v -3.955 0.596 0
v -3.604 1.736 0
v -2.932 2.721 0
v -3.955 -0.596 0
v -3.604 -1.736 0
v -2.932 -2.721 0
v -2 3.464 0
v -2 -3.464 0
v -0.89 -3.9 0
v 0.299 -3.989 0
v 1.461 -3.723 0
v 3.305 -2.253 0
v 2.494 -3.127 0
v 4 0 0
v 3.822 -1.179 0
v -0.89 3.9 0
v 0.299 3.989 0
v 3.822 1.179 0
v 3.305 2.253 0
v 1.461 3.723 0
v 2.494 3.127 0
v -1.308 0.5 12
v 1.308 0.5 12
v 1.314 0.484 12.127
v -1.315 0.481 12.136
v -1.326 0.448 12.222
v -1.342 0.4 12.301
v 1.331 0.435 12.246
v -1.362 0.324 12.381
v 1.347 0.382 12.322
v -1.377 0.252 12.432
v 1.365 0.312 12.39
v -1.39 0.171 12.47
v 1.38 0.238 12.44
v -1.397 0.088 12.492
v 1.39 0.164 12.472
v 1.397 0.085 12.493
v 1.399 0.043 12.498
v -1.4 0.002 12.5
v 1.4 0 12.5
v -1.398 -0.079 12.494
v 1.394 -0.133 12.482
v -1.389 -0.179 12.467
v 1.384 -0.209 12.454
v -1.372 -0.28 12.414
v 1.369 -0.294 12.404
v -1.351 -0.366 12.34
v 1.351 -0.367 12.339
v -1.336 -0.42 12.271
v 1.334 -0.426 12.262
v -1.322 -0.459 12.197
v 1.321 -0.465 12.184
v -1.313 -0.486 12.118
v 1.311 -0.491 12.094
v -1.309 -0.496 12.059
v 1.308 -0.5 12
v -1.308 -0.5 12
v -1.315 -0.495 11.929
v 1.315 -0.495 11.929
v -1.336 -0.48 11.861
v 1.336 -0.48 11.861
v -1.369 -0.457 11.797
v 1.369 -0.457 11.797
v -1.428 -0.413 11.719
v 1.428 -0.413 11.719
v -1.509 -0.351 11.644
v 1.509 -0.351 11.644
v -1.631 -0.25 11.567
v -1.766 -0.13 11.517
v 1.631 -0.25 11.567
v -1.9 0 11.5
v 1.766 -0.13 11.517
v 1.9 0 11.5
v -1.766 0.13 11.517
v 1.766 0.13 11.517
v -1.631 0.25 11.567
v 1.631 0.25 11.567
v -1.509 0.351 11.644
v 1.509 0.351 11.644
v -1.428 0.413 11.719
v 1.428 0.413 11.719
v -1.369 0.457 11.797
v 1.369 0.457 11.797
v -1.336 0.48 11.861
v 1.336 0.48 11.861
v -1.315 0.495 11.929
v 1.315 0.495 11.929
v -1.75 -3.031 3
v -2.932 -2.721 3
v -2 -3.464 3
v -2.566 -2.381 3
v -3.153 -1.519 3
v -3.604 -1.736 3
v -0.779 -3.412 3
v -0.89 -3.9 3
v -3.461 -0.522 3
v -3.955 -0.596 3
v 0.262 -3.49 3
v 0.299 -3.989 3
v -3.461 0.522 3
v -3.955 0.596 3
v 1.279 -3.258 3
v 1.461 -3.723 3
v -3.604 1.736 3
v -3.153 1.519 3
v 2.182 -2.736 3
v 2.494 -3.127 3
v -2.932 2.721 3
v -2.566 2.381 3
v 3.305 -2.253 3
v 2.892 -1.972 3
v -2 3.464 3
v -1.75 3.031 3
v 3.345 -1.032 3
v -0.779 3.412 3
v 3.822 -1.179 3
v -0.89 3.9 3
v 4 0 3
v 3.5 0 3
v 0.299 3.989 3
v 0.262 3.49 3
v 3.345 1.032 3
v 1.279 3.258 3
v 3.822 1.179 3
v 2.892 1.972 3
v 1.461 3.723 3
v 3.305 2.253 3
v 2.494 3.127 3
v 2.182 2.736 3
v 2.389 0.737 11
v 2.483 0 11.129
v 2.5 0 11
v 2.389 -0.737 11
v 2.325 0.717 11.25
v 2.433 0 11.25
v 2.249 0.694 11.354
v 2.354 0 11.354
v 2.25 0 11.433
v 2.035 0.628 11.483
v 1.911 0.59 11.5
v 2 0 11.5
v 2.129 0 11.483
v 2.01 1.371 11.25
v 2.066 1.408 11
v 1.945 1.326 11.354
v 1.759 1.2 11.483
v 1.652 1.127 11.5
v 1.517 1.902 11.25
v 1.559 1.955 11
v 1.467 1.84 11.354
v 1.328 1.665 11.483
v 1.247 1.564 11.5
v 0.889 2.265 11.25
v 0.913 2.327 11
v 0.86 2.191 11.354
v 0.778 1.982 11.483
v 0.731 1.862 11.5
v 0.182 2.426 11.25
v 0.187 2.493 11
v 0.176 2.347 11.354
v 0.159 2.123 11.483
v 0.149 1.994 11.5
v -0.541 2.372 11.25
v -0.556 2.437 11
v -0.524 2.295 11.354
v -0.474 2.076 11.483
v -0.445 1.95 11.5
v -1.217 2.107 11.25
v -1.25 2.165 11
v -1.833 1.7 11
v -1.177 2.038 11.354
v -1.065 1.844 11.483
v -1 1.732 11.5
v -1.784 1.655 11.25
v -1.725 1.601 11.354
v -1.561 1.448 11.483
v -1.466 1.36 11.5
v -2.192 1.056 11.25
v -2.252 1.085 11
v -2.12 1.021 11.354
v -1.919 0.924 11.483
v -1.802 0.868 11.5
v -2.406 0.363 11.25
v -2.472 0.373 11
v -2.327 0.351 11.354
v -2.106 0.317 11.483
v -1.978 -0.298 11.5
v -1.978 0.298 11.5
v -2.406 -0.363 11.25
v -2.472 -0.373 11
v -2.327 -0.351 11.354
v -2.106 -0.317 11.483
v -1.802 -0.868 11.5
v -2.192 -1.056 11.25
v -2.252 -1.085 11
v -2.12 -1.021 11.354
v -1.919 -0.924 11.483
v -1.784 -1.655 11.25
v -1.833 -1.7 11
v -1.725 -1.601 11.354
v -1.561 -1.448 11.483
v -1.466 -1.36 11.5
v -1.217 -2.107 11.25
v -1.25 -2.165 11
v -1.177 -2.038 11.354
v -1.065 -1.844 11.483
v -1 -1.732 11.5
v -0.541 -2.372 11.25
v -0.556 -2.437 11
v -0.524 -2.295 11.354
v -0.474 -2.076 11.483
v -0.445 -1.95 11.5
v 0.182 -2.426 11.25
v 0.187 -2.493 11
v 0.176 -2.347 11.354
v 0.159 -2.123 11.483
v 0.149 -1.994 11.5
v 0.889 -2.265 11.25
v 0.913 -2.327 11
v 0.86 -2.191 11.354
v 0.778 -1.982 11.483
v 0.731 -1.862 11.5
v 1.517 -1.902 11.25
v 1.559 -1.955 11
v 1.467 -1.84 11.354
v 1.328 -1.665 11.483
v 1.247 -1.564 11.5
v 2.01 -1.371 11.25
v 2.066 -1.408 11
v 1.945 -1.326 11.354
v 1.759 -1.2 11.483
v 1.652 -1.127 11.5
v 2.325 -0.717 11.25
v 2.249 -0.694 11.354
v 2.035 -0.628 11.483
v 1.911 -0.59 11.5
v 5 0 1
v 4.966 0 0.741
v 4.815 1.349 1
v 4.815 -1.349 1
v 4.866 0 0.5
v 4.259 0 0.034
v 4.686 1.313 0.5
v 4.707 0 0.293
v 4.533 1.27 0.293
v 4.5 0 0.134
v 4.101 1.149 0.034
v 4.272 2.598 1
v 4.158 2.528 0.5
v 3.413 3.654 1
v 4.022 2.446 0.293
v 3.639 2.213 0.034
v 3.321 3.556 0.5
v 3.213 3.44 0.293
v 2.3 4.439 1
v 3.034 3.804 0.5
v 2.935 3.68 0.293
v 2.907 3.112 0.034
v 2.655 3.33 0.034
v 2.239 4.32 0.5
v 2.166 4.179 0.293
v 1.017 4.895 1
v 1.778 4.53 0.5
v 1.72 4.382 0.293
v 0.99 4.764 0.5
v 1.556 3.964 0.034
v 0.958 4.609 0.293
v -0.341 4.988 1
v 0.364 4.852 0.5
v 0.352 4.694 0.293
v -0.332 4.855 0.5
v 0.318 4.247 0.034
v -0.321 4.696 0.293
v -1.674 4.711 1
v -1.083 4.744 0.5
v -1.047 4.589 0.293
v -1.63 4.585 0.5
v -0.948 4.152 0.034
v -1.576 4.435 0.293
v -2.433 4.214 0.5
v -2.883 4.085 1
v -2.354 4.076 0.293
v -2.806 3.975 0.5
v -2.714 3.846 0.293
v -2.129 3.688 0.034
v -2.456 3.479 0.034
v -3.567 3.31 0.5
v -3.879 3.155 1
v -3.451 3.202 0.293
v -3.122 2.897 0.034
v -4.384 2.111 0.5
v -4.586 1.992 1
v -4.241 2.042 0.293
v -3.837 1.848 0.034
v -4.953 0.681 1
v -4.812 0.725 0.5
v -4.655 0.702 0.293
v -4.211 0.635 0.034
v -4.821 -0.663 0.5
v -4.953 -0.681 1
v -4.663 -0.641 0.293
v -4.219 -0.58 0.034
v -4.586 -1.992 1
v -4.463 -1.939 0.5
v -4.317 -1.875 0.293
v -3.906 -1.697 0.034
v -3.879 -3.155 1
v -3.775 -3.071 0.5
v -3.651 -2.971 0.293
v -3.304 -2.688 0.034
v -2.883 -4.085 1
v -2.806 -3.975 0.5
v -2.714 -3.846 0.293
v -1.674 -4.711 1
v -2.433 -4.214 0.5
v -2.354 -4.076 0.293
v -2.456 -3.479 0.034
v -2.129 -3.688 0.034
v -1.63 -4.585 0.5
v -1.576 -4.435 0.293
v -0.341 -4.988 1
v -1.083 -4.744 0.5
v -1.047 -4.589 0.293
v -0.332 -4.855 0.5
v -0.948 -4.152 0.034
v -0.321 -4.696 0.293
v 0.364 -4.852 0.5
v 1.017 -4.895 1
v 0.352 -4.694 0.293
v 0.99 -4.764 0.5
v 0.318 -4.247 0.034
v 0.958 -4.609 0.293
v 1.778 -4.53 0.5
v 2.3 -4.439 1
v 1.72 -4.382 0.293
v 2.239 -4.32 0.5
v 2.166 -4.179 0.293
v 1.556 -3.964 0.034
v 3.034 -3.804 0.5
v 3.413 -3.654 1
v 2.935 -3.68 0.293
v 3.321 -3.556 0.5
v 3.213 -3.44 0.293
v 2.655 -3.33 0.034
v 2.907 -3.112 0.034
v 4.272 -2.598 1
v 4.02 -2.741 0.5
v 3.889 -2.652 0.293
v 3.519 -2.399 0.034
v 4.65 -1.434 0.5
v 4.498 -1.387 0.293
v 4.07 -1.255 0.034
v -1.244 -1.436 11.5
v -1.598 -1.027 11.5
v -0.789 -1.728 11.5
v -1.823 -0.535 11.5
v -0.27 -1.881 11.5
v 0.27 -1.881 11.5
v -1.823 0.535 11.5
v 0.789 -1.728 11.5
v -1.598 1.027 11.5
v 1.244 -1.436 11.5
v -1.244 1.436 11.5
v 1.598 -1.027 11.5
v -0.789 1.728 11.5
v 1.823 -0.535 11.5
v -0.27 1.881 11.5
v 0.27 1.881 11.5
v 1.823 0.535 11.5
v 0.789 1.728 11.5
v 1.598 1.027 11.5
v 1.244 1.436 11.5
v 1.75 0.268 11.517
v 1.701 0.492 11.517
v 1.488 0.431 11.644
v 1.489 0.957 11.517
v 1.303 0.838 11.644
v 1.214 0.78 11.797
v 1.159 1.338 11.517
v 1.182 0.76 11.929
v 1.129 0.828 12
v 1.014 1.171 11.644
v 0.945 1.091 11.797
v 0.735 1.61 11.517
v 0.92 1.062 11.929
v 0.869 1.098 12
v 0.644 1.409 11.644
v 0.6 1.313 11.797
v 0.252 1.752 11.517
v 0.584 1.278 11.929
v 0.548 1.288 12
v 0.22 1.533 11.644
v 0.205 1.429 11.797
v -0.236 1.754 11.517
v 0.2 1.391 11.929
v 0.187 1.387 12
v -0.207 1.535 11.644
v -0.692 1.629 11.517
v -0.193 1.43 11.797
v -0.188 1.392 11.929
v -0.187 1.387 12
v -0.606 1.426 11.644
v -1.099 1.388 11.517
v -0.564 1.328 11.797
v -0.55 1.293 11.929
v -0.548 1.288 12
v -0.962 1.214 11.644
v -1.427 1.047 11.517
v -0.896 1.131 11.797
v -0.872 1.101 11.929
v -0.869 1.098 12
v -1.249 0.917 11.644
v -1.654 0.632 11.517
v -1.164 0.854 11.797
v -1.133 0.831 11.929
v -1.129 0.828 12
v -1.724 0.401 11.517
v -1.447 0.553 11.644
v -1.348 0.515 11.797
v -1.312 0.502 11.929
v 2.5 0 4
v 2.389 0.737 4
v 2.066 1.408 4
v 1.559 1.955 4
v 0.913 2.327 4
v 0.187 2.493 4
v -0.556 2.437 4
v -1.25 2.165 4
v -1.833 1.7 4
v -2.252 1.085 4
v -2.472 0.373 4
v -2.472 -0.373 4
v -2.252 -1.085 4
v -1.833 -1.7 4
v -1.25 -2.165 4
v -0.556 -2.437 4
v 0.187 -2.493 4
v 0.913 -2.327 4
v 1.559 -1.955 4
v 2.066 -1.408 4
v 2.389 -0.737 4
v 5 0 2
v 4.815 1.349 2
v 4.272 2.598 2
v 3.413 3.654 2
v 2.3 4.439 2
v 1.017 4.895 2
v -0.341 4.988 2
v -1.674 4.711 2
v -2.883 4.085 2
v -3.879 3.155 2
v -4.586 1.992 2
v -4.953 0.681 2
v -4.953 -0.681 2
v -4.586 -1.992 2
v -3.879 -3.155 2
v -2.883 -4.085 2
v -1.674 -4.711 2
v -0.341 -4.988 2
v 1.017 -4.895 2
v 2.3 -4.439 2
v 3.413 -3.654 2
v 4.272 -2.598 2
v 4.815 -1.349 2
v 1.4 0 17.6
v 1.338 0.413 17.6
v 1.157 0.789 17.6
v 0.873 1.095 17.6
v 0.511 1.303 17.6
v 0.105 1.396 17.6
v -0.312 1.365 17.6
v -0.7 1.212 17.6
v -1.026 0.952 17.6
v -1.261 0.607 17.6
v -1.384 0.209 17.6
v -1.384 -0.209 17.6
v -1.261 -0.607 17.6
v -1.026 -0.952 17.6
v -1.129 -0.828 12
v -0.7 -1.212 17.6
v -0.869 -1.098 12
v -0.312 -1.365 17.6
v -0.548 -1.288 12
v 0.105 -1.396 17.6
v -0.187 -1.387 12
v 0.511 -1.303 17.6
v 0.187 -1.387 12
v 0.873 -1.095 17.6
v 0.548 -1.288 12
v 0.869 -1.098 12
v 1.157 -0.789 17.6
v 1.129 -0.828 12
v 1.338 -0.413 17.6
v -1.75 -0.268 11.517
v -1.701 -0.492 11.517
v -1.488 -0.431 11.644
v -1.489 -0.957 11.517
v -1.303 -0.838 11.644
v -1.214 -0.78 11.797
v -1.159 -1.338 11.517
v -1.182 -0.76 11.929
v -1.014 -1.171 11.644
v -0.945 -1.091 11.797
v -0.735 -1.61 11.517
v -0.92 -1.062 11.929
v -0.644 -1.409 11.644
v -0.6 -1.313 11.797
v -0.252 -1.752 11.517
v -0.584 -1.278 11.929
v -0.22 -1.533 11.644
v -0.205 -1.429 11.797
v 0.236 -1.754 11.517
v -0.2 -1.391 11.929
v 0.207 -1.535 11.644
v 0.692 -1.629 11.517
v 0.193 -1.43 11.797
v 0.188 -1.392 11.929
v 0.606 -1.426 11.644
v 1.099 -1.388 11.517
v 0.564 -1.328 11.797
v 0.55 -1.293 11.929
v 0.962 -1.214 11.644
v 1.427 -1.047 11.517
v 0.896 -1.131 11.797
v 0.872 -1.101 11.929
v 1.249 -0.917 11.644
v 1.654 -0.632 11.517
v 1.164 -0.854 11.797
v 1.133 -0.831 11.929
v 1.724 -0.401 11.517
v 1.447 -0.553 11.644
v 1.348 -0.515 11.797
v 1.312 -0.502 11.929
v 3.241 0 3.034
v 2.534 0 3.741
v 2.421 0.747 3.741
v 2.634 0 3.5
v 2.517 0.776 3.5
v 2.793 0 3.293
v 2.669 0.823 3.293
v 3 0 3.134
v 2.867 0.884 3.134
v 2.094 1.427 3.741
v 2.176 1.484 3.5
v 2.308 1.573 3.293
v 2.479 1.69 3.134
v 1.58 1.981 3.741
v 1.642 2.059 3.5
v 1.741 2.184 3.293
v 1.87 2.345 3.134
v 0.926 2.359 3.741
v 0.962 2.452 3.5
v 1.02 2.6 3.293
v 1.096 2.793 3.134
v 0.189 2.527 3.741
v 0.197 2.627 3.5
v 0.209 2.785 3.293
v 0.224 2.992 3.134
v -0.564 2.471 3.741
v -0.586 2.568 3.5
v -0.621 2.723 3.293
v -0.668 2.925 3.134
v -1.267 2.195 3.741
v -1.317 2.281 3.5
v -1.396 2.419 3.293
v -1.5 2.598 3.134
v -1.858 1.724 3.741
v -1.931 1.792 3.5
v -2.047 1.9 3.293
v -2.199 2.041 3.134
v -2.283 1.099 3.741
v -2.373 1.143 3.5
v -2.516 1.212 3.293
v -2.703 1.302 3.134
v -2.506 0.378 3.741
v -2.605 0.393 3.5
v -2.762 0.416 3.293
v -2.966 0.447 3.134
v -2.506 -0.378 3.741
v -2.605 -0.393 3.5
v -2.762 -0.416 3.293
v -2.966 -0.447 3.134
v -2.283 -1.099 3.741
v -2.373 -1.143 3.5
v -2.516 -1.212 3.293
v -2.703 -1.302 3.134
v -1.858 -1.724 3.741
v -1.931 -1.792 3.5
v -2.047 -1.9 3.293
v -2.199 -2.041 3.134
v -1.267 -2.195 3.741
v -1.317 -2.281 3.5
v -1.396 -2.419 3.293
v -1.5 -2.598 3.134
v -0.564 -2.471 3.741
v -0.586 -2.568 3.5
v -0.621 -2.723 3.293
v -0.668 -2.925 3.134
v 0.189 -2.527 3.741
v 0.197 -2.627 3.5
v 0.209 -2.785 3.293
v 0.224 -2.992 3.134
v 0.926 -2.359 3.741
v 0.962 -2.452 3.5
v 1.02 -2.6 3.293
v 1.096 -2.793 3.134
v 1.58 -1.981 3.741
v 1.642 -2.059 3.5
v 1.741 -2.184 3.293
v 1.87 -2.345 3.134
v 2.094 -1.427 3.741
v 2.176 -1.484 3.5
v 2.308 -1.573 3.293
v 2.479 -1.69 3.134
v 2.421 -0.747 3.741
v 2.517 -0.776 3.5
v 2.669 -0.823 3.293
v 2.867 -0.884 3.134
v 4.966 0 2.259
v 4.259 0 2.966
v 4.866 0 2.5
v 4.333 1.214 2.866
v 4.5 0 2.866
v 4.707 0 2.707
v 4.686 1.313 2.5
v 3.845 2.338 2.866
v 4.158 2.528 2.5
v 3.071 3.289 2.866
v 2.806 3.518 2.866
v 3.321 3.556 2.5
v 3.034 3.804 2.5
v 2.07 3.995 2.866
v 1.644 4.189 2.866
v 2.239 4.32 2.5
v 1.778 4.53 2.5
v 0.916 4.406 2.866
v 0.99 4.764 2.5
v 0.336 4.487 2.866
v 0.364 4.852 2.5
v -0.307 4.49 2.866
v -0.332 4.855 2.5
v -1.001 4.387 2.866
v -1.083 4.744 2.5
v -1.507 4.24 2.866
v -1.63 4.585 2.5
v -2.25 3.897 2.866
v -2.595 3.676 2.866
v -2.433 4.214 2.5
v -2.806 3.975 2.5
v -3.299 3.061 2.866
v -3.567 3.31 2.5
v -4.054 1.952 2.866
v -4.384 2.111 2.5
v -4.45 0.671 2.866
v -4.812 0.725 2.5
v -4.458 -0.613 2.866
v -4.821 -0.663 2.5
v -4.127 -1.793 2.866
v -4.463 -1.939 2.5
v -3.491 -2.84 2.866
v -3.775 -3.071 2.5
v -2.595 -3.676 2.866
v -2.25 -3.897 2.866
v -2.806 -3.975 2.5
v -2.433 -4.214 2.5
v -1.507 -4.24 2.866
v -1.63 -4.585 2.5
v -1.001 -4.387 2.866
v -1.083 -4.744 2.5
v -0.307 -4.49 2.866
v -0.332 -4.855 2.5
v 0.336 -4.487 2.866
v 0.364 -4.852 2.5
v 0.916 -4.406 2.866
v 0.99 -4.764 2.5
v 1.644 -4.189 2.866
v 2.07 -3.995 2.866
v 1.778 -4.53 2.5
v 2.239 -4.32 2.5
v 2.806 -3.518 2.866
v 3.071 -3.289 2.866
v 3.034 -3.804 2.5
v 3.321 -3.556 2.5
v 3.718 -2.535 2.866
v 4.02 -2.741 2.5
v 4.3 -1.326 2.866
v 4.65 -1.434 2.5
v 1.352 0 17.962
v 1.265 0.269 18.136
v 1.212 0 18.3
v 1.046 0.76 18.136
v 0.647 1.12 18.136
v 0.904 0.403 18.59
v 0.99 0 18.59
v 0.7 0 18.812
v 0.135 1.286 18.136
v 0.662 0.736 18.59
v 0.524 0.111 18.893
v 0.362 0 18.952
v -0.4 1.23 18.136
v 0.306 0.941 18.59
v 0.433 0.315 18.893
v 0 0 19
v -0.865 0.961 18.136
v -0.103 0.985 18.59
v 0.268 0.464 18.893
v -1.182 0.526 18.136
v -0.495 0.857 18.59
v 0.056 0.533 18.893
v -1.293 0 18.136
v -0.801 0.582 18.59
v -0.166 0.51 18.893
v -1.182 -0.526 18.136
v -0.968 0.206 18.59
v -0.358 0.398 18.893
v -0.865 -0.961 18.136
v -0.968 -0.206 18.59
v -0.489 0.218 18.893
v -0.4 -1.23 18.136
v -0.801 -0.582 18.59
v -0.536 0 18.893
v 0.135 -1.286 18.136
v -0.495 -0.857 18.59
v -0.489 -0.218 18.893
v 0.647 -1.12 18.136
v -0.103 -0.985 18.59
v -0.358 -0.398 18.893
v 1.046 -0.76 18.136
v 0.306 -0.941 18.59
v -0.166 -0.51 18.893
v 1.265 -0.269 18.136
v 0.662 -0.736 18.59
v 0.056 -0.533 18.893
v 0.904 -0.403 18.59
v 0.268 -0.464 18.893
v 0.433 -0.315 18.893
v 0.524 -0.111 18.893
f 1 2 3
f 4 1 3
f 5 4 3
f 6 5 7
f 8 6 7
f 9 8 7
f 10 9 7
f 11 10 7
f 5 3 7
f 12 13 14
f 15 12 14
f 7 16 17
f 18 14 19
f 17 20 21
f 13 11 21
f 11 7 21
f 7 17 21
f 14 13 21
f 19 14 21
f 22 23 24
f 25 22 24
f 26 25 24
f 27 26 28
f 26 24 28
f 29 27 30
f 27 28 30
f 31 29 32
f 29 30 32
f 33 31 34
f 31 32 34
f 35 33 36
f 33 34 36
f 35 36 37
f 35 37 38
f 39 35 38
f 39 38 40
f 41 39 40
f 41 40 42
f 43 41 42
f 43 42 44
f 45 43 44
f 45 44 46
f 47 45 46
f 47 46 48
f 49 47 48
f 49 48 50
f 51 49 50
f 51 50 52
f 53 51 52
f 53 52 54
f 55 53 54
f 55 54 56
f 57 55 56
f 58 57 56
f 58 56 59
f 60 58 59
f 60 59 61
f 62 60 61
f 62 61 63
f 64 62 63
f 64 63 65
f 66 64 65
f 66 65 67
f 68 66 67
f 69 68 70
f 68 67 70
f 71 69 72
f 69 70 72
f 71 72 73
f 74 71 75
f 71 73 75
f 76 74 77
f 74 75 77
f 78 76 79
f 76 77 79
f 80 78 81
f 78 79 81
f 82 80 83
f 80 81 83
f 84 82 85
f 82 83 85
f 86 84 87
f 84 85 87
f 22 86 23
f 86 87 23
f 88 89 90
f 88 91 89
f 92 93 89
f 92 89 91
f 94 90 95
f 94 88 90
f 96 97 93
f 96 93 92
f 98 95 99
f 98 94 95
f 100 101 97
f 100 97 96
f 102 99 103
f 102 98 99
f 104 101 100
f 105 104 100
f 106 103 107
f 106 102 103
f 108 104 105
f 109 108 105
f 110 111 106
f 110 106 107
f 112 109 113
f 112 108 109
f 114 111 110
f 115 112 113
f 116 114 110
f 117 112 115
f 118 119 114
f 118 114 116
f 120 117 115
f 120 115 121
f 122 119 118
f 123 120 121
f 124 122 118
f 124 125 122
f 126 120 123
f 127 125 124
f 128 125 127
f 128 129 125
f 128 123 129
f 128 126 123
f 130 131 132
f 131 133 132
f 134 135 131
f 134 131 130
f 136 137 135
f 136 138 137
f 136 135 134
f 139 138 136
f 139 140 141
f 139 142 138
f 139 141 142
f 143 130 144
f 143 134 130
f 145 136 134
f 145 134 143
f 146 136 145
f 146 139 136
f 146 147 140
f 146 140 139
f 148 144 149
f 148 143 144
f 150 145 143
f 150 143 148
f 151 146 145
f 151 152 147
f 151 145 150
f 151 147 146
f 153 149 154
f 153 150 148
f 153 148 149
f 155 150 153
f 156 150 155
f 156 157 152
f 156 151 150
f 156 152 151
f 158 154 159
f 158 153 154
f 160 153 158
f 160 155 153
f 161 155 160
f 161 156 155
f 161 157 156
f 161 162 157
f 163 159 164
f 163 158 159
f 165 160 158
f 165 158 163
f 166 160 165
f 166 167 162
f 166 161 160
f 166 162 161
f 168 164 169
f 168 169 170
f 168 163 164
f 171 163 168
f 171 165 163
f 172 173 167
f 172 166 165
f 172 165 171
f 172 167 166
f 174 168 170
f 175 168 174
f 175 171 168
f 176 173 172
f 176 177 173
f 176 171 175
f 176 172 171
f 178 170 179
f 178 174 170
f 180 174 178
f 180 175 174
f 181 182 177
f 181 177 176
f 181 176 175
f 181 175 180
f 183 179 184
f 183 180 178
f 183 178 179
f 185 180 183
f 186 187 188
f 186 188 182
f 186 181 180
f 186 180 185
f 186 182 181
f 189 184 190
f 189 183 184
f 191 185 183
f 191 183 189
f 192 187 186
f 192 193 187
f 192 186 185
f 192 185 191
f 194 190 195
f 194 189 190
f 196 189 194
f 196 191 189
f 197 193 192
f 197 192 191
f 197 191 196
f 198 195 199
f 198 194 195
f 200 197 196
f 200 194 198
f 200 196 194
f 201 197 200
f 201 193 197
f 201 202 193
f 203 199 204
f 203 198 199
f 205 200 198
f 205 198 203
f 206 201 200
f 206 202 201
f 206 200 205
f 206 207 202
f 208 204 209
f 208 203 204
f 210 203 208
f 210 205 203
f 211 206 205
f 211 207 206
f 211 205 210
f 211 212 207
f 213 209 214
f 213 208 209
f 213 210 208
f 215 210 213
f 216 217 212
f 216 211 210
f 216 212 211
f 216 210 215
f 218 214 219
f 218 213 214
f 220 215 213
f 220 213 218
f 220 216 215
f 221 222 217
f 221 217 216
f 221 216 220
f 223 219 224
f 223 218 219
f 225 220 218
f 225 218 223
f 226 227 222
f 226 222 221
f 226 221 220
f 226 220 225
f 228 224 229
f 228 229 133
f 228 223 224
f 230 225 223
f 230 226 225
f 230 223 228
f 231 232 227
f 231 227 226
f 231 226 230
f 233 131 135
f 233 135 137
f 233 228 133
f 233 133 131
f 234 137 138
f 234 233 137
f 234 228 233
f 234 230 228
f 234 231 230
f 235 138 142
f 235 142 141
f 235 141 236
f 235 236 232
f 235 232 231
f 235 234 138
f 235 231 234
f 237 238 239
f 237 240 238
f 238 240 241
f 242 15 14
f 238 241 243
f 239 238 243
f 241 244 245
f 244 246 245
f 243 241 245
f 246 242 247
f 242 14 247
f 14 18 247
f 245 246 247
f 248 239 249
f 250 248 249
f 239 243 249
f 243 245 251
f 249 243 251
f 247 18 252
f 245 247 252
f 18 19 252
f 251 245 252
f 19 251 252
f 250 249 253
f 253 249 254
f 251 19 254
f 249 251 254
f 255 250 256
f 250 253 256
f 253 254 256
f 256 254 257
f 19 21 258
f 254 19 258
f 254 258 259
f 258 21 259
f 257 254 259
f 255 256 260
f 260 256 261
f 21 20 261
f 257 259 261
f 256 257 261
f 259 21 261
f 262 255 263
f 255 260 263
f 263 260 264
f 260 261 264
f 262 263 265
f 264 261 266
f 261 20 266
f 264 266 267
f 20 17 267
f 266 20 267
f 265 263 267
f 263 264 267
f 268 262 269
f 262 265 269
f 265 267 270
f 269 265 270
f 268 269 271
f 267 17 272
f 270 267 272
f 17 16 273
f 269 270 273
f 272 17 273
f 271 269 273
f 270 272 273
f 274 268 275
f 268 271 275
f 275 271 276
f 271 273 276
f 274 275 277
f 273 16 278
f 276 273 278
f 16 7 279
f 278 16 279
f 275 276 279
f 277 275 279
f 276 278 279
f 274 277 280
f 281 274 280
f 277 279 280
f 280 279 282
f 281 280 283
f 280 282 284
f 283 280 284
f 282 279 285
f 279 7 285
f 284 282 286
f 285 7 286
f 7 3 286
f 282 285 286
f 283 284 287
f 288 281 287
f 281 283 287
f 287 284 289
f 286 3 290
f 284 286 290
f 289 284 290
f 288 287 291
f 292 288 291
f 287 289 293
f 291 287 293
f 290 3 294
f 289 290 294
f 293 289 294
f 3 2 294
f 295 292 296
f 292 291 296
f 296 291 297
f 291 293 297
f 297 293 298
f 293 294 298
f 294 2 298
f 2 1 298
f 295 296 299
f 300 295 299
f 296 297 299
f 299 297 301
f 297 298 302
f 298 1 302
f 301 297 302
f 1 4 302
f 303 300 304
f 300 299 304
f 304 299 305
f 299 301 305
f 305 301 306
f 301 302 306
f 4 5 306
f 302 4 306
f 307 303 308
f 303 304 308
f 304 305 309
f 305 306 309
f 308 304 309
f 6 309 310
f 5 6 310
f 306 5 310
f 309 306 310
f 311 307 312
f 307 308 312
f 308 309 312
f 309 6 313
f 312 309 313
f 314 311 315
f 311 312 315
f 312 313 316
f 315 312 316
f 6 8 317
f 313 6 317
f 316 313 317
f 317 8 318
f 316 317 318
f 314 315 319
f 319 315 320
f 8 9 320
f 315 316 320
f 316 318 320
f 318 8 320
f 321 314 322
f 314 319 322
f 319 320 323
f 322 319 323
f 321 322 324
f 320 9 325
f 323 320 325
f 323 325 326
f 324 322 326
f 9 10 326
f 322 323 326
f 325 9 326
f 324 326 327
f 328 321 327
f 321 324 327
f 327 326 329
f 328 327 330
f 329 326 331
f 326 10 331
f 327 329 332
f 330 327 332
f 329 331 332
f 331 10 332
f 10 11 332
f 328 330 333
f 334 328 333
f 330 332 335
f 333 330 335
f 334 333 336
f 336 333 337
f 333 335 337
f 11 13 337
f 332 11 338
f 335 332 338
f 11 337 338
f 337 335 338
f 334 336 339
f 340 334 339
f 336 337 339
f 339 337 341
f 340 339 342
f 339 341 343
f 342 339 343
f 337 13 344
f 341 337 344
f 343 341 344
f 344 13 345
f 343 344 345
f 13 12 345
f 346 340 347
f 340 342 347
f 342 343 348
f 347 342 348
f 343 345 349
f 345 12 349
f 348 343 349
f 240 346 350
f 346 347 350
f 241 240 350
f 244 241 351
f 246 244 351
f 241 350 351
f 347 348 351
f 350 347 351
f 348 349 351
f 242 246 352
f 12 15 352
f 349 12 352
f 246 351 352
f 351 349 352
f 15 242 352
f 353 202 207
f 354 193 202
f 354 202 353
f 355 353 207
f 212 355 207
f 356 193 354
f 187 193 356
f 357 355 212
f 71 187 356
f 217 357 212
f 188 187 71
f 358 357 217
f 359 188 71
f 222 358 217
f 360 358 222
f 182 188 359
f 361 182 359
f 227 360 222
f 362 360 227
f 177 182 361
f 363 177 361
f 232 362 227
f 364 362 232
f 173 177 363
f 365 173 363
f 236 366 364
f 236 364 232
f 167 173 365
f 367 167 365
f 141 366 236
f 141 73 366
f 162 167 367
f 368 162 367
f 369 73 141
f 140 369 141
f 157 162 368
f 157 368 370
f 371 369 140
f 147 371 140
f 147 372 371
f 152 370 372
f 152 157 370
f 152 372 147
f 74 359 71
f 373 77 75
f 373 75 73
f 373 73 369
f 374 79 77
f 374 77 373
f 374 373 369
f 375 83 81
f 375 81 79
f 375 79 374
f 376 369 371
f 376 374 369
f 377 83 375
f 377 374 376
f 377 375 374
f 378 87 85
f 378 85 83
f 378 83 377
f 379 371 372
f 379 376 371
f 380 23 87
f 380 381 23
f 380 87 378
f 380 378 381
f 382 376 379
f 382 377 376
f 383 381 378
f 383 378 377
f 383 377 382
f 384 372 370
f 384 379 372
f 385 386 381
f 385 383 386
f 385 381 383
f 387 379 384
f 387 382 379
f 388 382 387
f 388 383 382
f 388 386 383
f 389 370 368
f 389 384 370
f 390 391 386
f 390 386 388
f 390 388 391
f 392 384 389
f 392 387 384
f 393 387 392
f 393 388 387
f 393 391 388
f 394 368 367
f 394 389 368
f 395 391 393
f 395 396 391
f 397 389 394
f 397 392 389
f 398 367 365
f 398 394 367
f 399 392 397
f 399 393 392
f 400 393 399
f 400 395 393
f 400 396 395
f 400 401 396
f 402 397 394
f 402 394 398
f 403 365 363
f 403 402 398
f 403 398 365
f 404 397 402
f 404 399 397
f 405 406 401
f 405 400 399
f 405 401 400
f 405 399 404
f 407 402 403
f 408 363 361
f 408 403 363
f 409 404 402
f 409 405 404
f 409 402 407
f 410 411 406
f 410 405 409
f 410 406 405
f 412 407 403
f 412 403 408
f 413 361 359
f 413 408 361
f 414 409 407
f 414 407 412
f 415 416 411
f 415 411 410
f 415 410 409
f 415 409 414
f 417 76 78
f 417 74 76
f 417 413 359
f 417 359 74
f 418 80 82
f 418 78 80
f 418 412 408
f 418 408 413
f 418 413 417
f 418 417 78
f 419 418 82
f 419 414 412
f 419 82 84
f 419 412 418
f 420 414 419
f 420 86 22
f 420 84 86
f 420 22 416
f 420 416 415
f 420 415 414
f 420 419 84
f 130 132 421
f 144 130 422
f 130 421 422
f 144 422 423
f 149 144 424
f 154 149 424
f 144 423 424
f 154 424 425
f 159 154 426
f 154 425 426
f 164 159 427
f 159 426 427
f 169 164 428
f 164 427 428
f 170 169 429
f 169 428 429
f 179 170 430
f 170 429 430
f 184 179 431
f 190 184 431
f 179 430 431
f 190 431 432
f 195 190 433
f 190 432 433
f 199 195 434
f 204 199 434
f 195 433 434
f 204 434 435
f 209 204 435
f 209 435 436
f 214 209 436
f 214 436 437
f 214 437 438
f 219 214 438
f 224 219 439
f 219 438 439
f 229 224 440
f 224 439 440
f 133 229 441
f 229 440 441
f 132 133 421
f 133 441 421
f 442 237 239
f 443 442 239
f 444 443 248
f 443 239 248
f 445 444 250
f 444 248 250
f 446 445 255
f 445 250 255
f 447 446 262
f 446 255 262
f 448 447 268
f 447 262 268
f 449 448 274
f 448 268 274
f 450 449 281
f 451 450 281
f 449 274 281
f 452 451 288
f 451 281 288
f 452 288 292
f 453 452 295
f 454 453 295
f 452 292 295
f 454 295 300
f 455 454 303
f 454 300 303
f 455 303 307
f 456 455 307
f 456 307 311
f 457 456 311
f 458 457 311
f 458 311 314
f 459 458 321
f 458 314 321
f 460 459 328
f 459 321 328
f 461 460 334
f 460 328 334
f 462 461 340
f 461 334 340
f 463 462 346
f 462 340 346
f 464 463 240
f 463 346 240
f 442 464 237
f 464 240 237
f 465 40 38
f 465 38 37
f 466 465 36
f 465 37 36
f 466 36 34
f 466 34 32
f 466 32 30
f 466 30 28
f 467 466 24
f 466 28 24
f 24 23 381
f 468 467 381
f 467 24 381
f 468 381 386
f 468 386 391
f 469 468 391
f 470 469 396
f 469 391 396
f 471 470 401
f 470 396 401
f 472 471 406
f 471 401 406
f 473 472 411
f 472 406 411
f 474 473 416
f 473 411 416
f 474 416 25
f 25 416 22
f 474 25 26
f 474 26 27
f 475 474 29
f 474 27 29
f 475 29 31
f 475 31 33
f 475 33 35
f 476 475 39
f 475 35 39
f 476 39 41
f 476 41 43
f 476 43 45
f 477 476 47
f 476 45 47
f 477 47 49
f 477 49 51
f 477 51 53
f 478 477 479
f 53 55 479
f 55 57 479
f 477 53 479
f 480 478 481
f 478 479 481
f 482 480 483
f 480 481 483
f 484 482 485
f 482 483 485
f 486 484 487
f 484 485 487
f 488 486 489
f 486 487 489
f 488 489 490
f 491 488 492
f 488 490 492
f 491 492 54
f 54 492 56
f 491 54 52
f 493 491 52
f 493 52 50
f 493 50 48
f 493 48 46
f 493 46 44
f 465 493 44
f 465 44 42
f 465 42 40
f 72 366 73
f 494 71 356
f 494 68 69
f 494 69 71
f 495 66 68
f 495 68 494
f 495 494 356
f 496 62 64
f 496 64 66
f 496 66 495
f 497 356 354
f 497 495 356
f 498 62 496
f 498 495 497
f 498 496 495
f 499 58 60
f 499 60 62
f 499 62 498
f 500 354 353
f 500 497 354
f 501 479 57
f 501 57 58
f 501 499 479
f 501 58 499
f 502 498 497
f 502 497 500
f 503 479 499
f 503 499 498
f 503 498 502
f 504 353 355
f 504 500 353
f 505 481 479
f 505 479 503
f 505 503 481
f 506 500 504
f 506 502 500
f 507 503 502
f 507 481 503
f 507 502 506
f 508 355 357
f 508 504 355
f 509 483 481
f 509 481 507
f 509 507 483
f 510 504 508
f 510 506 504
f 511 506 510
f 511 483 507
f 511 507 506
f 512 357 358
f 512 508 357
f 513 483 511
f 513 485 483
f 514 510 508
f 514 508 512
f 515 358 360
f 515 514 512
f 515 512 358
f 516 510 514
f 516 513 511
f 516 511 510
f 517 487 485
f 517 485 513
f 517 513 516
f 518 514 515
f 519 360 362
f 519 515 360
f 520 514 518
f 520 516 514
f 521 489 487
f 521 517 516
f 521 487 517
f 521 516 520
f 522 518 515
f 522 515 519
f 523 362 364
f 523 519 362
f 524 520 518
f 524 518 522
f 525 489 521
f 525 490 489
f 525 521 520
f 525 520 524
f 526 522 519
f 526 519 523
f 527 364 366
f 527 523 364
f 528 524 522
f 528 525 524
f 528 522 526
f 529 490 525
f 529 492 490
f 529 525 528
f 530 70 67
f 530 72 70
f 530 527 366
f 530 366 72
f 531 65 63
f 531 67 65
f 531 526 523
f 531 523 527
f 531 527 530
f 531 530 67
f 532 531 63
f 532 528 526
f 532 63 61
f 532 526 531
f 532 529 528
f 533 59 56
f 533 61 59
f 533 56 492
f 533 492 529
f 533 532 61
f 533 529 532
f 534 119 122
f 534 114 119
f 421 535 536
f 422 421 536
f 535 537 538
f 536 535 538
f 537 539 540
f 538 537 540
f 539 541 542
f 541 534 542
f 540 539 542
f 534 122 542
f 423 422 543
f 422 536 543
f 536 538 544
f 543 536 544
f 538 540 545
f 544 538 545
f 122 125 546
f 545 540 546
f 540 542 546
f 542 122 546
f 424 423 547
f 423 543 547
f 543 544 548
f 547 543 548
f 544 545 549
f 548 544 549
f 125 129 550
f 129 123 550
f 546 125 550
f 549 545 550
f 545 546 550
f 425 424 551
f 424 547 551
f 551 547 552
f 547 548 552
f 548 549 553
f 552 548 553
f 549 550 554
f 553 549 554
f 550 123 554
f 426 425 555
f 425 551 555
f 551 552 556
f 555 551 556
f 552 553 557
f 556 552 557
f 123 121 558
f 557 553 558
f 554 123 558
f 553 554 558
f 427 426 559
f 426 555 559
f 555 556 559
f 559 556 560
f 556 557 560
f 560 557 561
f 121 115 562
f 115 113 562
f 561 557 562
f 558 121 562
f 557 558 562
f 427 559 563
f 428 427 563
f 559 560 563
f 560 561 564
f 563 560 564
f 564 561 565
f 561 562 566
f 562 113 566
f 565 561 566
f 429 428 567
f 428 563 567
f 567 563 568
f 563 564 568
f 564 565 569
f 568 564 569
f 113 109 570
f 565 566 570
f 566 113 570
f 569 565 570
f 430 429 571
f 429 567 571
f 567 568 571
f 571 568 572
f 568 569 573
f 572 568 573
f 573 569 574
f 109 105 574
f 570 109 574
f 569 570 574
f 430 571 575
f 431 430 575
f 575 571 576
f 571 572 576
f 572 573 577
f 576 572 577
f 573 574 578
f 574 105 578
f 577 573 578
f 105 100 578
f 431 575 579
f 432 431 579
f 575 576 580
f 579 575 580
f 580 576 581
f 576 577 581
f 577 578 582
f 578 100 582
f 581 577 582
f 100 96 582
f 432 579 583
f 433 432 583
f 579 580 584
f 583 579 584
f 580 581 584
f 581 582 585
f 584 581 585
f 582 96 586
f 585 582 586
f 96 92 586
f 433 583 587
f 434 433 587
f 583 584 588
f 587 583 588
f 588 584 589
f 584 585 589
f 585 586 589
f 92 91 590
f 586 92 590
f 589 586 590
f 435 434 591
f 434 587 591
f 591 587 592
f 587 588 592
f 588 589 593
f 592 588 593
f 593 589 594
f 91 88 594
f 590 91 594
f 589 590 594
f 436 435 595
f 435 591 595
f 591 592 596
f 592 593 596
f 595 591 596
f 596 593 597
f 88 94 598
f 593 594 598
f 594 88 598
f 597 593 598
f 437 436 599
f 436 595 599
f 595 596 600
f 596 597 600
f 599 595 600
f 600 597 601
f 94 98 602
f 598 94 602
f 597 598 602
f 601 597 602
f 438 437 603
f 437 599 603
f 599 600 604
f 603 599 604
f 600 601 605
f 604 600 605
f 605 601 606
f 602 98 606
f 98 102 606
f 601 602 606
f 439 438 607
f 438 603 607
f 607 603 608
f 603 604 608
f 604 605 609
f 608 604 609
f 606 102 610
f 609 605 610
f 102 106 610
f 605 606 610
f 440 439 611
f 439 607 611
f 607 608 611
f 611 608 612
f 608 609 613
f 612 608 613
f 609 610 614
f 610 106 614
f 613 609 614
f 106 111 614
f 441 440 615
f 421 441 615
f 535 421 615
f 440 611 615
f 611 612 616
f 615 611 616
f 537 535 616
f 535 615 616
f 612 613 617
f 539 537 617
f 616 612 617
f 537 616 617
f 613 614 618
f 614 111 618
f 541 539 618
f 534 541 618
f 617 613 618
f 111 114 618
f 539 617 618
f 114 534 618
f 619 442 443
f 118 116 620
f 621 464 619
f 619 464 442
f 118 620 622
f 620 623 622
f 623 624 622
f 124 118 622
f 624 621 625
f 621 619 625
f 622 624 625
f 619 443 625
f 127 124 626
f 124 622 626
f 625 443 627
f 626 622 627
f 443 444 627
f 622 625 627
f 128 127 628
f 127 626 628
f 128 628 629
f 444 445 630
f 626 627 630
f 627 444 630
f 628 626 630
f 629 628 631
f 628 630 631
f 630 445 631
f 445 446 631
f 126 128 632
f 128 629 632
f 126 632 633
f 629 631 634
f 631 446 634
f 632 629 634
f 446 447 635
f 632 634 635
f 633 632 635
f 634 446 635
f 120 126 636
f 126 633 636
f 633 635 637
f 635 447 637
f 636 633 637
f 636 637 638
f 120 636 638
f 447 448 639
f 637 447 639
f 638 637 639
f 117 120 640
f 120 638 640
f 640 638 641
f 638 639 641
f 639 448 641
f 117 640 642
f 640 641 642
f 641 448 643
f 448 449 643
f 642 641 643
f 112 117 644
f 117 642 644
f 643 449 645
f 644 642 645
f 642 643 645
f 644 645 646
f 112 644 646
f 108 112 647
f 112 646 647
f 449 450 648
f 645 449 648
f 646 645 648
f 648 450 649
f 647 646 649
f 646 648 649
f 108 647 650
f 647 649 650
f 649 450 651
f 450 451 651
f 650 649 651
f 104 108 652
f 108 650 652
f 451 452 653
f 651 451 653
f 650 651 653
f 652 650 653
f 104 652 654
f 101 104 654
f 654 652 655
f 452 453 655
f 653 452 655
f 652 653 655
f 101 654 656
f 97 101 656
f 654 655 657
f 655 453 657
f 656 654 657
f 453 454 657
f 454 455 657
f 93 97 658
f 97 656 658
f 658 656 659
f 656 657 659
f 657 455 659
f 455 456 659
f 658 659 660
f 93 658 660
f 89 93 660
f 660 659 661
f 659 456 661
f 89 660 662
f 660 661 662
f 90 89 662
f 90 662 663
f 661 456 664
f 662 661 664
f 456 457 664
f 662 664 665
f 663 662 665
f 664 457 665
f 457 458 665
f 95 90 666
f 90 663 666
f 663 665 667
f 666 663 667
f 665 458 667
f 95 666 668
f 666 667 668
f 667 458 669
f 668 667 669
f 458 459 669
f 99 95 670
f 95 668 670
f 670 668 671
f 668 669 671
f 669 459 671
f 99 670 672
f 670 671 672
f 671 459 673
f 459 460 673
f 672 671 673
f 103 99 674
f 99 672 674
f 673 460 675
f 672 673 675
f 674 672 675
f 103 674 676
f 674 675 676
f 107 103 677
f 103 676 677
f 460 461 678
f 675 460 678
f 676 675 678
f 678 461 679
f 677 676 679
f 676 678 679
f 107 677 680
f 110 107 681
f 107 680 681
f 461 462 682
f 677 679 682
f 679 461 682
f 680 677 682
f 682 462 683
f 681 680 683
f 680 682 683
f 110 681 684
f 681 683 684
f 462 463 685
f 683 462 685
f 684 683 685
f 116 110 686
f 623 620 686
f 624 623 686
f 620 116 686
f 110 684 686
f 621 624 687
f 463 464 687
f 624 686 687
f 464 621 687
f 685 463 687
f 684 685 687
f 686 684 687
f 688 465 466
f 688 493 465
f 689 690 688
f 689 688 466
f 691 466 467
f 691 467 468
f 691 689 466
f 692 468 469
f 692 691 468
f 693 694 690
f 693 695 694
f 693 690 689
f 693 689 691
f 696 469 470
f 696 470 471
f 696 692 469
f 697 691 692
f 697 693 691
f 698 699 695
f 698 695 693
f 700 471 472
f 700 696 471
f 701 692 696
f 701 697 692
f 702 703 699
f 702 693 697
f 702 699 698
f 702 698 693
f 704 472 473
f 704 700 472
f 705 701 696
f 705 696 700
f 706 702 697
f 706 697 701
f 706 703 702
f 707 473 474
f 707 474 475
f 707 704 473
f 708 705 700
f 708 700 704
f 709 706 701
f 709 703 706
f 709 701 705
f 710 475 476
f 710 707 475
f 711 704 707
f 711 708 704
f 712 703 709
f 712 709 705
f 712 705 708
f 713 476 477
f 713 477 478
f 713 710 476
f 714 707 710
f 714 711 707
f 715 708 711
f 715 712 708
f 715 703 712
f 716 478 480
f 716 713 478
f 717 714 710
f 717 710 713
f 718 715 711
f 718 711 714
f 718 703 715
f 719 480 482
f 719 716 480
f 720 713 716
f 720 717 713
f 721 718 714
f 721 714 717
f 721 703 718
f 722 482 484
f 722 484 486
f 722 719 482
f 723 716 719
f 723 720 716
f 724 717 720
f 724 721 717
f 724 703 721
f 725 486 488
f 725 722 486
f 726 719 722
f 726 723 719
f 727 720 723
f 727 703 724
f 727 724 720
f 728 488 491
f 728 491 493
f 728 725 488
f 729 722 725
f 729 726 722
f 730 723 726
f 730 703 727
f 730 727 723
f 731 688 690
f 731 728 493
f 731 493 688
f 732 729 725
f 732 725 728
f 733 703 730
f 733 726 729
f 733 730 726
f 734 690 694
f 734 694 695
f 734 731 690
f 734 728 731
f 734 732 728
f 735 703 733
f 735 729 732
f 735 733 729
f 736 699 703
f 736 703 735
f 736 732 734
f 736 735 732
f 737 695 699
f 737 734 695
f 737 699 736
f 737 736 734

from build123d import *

# Parameters (mm, degrees)
F0_R      = 5
F1_DEPTH  = 3
F2_R      = 2.5
F3_DEPTH  = 8.5
F4_R      = 1.4
F5_DEPTH  = 7.5
F6_R      = 1.4
F7_R      = 1
F8_R      = 0.5
F9_R      = 0.5
F10_DEPTH = 2.5


with BuildPart() as f1:
    # F0 (on Top) → F1 (new body)
    with BuildSketch(Plane.XY):
        Circle(F0_R)
    extrude(amount=F1_DEPTH)

    # F2 (on face) → F3 (join)
    with BuildSketch(Plane.XY.offset(3)):
        Circle(F2_R)
    extrude(amount=F3_DEPTH)

    # F4 (on face) → F5 (join)
    with BuildSketch(Plane.XY.offset(11.5)):
        Circle(F4_R)
    extrude(amount=F5_DEPTH)

    # F6
    f6_edges = [f1.edges().sort_by_distance(p)[0] for p in [
        (-1.4, 0, 19),
    ]]
    fillet(f6_edges, radius=F6_R)

    # F7
    f7_edges = [f1.edges().sort_by_distance(p)[0] for p in [
        (-2.5, 0, 3),
        (-5, 0, 0),
        (-5, 0, 3),
    ]]
    fillet(f7_edges, radius=F7_R)

    # F8
    f8_edges = [f1.edges().sort_by_distance(p)[0] for p in [
        (-1.4, 0, 11.5),
        (-2.5, 0, 11.5),
    ]]
    fillet(f8_edges, radius=F8_R)

    # F9 (on Right) → F10 (cut, symmetric)
    with BuildSketch(Plane.YZ):
        with Locations((0, 12)):
            Circle(F9_R)
    extrude(amount=F10_DEPTH, both=True, mode=Mode.SUBTRACT)


solid = f1.part
